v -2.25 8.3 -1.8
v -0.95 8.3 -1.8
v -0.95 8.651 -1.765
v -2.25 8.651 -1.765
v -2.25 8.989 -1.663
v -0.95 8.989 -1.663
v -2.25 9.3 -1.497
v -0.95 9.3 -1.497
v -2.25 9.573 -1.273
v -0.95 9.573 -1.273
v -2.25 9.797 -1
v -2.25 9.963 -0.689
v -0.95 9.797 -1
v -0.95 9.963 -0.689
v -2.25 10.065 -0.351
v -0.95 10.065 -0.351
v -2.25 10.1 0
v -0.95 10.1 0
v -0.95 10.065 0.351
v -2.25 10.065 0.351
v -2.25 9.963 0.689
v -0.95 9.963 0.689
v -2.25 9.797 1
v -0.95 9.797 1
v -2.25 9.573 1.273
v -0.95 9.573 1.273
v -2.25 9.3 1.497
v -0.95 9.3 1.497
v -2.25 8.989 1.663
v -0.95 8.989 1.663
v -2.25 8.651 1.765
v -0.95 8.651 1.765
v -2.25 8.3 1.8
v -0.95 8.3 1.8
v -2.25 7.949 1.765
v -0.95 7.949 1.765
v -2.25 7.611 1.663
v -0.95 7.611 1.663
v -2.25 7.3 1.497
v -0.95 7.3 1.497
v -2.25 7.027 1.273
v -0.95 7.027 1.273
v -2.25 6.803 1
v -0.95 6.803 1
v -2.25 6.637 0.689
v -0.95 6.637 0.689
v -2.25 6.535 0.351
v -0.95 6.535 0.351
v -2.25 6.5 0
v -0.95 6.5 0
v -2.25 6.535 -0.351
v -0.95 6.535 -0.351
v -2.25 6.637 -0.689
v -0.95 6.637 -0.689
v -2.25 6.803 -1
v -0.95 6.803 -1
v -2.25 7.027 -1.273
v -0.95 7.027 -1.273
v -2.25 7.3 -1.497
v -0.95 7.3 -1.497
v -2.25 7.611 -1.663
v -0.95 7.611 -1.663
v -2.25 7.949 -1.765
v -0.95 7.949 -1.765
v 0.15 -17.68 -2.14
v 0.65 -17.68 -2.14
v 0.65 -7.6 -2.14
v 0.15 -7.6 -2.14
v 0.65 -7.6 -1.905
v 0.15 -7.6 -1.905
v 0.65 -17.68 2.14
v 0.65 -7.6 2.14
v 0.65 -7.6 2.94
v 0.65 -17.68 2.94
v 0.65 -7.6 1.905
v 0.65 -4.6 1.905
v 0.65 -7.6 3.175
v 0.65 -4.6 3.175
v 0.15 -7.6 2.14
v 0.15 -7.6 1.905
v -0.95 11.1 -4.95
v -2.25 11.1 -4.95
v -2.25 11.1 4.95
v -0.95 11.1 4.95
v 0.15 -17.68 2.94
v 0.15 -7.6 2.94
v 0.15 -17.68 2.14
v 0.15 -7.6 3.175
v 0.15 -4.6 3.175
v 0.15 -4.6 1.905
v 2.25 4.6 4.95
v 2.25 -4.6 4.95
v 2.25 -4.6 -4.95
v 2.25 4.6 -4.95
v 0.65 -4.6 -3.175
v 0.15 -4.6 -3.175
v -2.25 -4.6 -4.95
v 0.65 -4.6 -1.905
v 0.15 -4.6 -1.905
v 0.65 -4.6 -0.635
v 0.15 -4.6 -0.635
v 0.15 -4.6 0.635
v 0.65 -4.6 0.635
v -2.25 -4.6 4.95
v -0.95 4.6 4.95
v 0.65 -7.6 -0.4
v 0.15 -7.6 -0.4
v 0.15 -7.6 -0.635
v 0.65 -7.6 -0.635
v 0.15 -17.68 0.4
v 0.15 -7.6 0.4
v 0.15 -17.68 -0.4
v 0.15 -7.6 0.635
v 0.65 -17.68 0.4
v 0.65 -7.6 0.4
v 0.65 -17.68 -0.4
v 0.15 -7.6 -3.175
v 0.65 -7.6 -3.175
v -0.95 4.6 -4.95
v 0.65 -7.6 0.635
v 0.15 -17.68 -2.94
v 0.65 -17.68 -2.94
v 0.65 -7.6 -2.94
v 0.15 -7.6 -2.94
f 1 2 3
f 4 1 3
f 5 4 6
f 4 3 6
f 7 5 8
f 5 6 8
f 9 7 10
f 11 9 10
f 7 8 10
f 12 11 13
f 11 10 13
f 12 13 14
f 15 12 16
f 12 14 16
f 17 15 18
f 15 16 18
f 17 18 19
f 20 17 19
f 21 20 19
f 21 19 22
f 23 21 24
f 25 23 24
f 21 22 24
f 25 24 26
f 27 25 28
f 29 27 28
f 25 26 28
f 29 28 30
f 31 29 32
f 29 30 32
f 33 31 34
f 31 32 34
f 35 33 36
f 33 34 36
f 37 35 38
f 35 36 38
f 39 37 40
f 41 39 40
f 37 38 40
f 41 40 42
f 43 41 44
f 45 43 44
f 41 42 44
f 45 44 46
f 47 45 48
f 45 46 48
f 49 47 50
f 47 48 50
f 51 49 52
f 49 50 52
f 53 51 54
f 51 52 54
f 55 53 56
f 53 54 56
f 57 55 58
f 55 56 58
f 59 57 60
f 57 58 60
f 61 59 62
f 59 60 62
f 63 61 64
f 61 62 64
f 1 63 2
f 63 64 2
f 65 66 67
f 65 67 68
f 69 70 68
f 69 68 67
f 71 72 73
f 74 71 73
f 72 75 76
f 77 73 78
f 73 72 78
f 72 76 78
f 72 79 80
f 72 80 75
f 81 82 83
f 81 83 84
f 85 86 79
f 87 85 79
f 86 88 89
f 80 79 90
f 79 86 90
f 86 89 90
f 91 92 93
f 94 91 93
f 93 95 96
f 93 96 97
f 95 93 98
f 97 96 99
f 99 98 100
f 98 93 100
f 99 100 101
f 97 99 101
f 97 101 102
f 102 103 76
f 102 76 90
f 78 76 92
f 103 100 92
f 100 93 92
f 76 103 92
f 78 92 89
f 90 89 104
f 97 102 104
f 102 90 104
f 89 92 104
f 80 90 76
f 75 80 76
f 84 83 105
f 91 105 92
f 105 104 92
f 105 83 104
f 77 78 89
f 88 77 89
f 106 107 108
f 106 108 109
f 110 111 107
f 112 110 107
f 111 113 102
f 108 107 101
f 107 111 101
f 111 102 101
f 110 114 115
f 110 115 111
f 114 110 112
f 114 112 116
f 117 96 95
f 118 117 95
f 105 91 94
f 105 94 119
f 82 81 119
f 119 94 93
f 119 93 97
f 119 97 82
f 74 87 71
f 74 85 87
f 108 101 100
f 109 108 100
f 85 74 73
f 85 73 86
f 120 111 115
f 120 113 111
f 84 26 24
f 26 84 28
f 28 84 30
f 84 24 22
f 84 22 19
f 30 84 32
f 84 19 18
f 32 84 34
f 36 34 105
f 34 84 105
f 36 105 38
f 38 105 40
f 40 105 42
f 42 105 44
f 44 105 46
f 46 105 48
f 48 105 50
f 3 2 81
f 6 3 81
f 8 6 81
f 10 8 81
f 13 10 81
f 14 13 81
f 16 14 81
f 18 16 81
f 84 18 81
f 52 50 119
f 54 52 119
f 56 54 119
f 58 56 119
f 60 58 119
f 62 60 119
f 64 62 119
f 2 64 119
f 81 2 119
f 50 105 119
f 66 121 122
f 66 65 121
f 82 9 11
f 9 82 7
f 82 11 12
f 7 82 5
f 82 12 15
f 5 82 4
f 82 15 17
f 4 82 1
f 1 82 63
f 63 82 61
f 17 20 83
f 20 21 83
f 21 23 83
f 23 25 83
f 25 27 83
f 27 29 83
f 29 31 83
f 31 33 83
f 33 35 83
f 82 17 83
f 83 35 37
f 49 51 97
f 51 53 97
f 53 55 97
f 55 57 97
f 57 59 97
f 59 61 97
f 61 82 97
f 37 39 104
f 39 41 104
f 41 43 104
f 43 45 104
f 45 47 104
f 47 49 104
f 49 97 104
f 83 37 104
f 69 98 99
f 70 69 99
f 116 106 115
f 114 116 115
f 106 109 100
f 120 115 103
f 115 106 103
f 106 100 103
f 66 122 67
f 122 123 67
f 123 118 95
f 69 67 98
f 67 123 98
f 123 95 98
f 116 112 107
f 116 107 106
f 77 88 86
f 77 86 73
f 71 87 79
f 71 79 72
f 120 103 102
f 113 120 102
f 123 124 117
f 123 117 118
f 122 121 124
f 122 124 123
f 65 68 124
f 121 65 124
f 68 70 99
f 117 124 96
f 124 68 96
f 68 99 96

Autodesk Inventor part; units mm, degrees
ref_plane "YZ Plane" through (0, 0, 0) normal (1, 0, 0) x (0, 1, 0)
ref_plane "XZ Plane" through (0, 0, 0) normal (0, 1, 0) x (-1, 0, 0)
ref_plane "XY Plane" through (0, 0, 0) normal (0, 0, 1) x (1, 0, 0)
sketch "Boceto1" plane through (0, 0, 0) normal (0, 1, 0) x (-1, 0, 0)
  line L0 (2.25, 4.95) -> (-2.25, 4.95)
  line L1 (-2.25, 4.95) -> (-2.25, -4.95)
  line L2 (-2.25, -4.95) -> (2.25, -4.95)
  line L3 (2.25, -4.95) -> (2.25, 4.95)
  point P0 (0, 0)
  dimension "d0" = 4.5
  dimension "d1" = 9.9
  dimension "d2" = 4.95
  dimension "d3" = 2.25
extrude "Extrusión1" add sketch "Boceto1" along normal mid plane 9.2
sketch "Boceto2" plane through (0, 4.6, 0) normal (0, 1, 0) x (1, 0, 0)
  line L0 (2.25, 4.95) -> (-2.25, 4.95) projected
  line L1 (-2.25, 4.95) -> (-2.25, -4.95) projected
  line L2 (-2.25, -4.95) -> (2.25, -4.95) projected
  line L3 (2.25, -4.95) -> (2.25, 4.95) projected
  line L4 (2.25, 4.95) -> (-2.25, 4.95) projected
  line L5 (-2.25, -4.95) -> (-0.95, -4.95)
  line L6 (-0.95, -4.95) -> (-0.95, 4.95)
  line L7 (-0.95, 4.95) -> (-2.25, 4.95)
  line L8 (-2.25, 4.95) -> (-2.25, -4.95)
  point P0 (0, 0)
  point P1 (-0.95, 4.95)
  dimension "d6" = 1.3
extrude "Extrusión2" add sketch "Boceto2" along normal blind 6.5 contours L6 L2 L1 L0
sketch "Boceto3" plane through (-0.95, 4.6, 4.95) normal (1, 0, 0) x (0, 0, -1)
  line L0 (9.9, 0) -> (0, 0) projected
  line L1 (9.9, 0) -> (9.9, 6.5) projected
  line L2 (0, 6.5) -> (9.9, 6.5) projected
  line L3 (0, 0) -> (0, 6.5) projected
  circle A0 centre (4.95, 3.7) radius 1.8
  point P0 (4.95, -4.6)
  dimension "d9" = 3.6
  dimension "d10" = 4.95
  dimension "d11" = 3.7
extrude "Extrusión3" cut sketch "Boceto3" against normal blind 6.5 contours A0
sketch "Boceto4" plane through (0, -4.6, 0) normal (0, -1, 0) x (1, 0, 0)
  line L0 (-2.25, -4.95) -> (2.25, -4.95) projected
  line L1 (2.25, -4.95) -> (2.25, 4.95) projected
  line L2 (2.25, 4.95) -> (-2.25, 4.95) projected
  line L3 (-2.25, 4.95) -> (-2.25, -4.95) projected
  line L4 (0.65, 3.175) -> (0.15, 3.175)
  line L5 (0.15, 3.175) -> (0.15, 1.905)
  line L6 (0.15, 1.905) -> (0.65, 1.905)
  line L7 (0.65, 1.905) -> (0.65, 3.175)
  line L8 (0.65, 0.635) -> (0.15, 0.635)
  line L9 (0.15, 0.635) -> (0.15, -0.635)
  line L10 (0.15, -0.635) -> (0.65, -0.635)
  line L11 (0.65, -0.635) -> (0.65, 0.635)
  line L12 (0.65, -1.905) -> (0.15, -1.905)
  line L13 (0.15, -1.905) -> (0.15, -3.175)
  line L14 (0.15, -3.175) -> (0.65, -3.175)
  line L15 (0.65, -3.175) -> (0.65, -1.905)
  point P0 (0, 0)
  dimension "d14" = 1.27
  dimension "d15" = 1.27
  dimension "d16" = 1.27
  dimension "d17" = 0.5
  dimension "d18" = 0.5
  dimension "d19" = 0.5
  dimension "d20" = 1.27
  dimension "d21" = 1.27
  dimension "d22" = 4.315
  dimension "d23" = 2.4
extrude "Extrusión4" add sketch "Boceto4" along normal blind 3 contours L7 L6 L5 L4 | L11 L10 L9 L8 | L15 L14 L13 L12
sketch "Boceto5" plane through (0, -7.6, 0) normal (0, -1, 0) x (1, 0, 0)
  line L0 (0.15, 3.175) -> (0.15, 1.905) projected
  line L1 (0.15, 1.905) -> (0.65, 1.905) projected
  line L2 (0.65, 1.905) -> (0.65, 3.175) projected
  line L3 (0.65, 3.175) -> (0.15, 3.175) projected
  line L4 (0.15, 0.635) -> (0.15, -0.635) projected
  line L5 (0.15, -0.635) -> (0.65, -0.635) projected
  line L6 (0.65, -0.635) -> (0.65, 0.635) projected
  line L7 (0.65, 0.635) -> (0.15, 0.635) projected
  line L8 (0.65, -1.905) -> (0.15, -1.905) projected
  line L9 (0.15, -1.905) -> (0.15, -3.175) projected
  line L10 (0.15, -3.175) -> (0.65, -3.175) projected
  line L11 (0.65, -3.175) -> (0.65, -1.905) projected
  line L12 (0.15, 1.905) -> (0.15, 3.175) projected
  line L13 (0.65, 2.94) -> (0.15, 2.94)
  line L14 (0.15, 2.94) -> (0.15, 2.14)
  line L15 (0.15, 2.14) -> (0.65, 2.14)
  line L16 (0.65, 2.14) -> (0.65, 2.94)
  line L17 (0.15, 0.635) -> (0.15, -0.635) projected
  line L18 (0.65, 0.4) -> (0.15, 0.4)
  line L19 (0.15, 0.4) -> (0.15, -0.4)
  line L20 (0.15, -0.4) -> (0.65, -0.4)
  line L21 (0.65, -0.4) -> (0.65, 0.4)
  line L22 (0.65, -1.905) -> (0.65, -3.175) projected
  line L23 (0.15, -3.175) -> (0.15, -1.905) projected
  line L24 (0.65, -2.14) -> (0.15, -2.14)
  line L25 (0.15, -2.14) -> (0.15, -2.94)
  line L26 (0.15, -2.94) -> (0.65, -2.94)
  line L27 (0.65, -2.94) -> (0.65, -2.14)
  point P0 (0, 0)
  point P1 (0.15, -2.14)
  dimension "d26" = 0.8
  dimension "d27" = 0.8
  dimension "d28" = 0.8
  dimension "d29" = 0.235
  dimension "d30" = 0.235
  dimension "d31" = 0.235
extrude "Extrusión5" add sketch "Boceto5" along normal blind 10.08 contours L13 L2 L15 L0 | L18 L6 L20 L4 | L11 L26 L9 L24
sketch "Boceto6" plane through (2.25, -4.6, -4.95) normal (1, 0, 0) x (0, 0, -1)
  line L0 (-8.7824, 7.8194) -> (-0.868, 7.8194) construction
  line L1 (-0.868, 7.8194) -> (-0.868, 3.7441) construction
  line L2 (-0.868, 3.7441) -> (-8.7824, 3.7441) construction
  line L3 (-8.7824, 3.7441) -> (-8.7824, 7.8194) construction
  point P0 (-4.95, 4.6)
properties part number "7805"
